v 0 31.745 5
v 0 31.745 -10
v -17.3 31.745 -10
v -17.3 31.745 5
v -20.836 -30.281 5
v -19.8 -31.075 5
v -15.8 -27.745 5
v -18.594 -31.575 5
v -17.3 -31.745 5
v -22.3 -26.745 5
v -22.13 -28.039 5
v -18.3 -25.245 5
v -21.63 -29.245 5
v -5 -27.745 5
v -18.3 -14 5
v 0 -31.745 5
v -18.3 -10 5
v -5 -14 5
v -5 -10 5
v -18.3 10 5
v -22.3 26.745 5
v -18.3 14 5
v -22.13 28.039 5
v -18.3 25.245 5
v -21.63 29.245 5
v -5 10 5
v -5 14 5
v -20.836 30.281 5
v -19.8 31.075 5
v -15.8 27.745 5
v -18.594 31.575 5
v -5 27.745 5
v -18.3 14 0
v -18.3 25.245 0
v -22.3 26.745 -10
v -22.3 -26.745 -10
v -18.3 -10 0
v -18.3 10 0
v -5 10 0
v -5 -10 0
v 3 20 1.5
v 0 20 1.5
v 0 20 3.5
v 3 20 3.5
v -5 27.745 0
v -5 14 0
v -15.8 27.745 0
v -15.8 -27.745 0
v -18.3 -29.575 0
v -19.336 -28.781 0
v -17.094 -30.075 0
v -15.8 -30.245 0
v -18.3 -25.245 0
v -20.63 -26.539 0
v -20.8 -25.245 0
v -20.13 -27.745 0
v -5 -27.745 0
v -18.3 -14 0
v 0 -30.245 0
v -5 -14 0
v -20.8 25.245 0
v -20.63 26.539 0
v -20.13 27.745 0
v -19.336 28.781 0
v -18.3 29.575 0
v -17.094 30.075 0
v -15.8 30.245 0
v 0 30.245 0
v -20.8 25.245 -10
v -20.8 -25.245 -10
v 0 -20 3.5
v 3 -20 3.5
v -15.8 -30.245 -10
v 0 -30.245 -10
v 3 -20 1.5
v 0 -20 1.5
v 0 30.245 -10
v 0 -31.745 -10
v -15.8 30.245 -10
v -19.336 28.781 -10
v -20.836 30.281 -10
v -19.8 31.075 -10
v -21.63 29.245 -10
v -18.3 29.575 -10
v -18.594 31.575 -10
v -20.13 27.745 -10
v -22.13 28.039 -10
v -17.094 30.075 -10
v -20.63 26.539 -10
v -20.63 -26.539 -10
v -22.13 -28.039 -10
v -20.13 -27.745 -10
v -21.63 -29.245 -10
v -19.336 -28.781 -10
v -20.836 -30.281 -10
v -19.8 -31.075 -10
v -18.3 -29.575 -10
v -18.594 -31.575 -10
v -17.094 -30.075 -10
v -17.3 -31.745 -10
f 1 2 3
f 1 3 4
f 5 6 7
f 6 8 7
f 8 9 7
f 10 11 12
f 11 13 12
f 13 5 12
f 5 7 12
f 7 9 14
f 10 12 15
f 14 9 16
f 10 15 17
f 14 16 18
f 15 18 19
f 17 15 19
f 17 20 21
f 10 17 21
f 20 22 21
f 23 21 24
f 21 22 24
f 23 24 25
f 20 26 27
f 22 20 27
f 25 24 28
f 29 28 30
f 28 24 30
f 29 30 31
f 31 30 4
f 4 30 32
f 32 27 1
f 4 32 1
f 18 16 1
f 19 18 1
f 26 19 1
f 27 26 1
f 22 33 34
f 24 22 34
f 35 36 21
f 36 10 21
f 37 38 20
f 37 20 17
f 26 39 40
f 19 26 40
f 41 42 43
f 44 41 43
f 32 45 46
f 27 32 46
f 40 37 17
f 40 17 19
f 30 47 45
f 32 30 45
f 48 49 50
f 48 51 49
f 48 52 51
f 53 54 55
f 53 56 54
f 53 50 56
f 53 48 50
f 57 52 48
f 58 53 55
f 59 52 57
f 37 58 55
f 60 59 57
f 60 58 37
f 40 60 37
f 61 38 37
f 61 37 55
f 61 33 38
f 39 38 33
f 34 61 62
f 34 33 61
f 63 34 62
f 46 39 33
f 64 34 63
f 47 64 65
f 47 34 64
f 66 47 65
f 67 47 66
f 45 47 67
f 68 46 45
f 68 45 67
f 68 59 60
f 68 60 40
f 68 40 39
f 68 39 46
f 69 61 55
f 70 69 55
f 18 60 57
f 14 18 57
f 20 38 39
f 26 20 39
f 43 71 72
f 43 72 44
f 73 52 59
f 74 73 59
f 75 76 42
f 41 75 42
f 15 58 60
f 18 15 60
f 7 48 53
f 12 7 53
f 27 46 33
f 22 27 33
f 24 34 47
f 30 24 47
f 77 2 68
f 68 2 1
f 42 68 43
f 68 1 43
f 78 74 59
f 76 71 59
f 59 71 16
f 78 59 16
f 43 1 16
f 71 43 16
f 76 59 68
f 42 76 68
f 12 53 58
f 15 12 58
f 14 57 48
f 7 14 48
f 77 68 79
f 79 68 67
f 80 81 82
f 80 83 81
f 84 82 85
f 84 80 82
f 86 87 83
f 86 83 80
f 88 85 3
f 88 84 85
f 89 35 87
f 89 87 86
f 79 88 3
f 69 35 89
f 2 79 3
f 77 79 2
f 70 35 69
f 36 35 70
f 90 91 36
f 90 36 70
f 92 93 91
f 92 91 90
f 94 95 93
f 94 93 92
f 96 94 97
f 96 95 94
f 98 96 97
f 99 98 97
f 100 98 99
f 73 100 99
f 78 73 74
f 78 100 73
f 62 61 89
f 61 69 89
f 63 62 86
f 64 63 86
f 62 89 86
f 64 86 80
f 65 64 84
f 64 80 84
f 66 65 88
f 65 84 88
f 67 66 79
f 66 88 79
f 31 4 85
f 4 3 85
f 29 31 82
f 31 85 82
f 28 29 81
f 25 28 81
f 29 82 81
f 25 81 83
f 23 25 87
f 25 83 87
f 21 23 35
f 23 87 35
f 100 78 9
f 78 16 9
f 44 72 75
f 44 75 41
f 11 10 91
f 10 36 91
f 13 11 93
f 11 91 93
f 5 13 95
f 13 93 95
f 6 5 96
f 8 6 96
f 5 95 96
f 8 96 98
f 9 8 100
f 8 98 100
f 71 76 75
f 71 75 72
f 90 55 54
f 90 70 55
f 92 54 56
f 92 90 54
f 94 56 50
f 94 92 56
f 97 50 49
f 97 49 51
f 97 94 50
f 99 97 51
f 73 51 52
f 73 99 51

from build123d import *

# Parameters (mm, degrees)
F0_W     = 63.49
F0_H     = 5
F1_DEPTH = 22.3
F2_W     = 40
F2_H     = 2
F3_DEPTH = 3
F5_DEPTH = 10
F6_R     = 5
F7_W     = 13.3
F7_H     = 20
F8_DEPTH = 25


with BuildPart() as f1:
    # F0 (on Right) → F1 (new body)
    with BuildSketch(Plane.YZ):
        with Locations((0, 2.5)):
            Rectangle(F0_W, F0_H)
    extrude(amount=-F1_DEPTH)

    # F2 (on face) → F3 (join)
    with BuildSketch(Plane.YZ):
        with Locations((0, 2.5)):
            Rectangle(F2_W, F2_H)
    extrude(amount=F3_DEPTH)

    # F4 (on face) → F5 (join)
    with BuildSketch(Plane(origin=(0, 0, 0), x_dir=(1, 0, 0), z_dir=(0, 0, -1))):
        Polygon((0, 30.245), (0, 31.745), (-22.3, 31.745), (-22.3, -31.745), (0, -31.745), (0, -30.245), (-20.8, -30.245), (-20.8, 30.245), align=None)
    extrude(amount=F5_DEPTH)

    # F6
    f6_edges = [f1.edges().sort_by_distance(p)[0] for p in [
        (-22.3, -31.745, -2.5),
        (-22.3, 31.745, -2.5),
        (-20.8, 30.245, -5),
        (-20.8, -30.245, -5),
    ]]
    fillet(f6_edges, radius=F6_R)

    # F7 (on face) → F8 (cut)
    with BuildSketch(Plane(origin=(0, 0, 0), x_dir=(1, 0, 0), z_dir=(0, 0, -1))):
        with Locations((-11.65, 0)):
            Rectangle(F7_W, F7_H)
        Polygon((-18.3, 14), (-5, 14), (-5, 27.745), (-15.8, 27.745), (-18.3, 25.245), align=None)
        Polygon((-5, -27.745), (-5, -14), (-18.3, -14), (-18.3, -25.245), (-15.8, -27.745), align=None)
    extrude(amount=-F8_DEPTH, mode=Mode.SUBTRACT)


solid = f1.part
